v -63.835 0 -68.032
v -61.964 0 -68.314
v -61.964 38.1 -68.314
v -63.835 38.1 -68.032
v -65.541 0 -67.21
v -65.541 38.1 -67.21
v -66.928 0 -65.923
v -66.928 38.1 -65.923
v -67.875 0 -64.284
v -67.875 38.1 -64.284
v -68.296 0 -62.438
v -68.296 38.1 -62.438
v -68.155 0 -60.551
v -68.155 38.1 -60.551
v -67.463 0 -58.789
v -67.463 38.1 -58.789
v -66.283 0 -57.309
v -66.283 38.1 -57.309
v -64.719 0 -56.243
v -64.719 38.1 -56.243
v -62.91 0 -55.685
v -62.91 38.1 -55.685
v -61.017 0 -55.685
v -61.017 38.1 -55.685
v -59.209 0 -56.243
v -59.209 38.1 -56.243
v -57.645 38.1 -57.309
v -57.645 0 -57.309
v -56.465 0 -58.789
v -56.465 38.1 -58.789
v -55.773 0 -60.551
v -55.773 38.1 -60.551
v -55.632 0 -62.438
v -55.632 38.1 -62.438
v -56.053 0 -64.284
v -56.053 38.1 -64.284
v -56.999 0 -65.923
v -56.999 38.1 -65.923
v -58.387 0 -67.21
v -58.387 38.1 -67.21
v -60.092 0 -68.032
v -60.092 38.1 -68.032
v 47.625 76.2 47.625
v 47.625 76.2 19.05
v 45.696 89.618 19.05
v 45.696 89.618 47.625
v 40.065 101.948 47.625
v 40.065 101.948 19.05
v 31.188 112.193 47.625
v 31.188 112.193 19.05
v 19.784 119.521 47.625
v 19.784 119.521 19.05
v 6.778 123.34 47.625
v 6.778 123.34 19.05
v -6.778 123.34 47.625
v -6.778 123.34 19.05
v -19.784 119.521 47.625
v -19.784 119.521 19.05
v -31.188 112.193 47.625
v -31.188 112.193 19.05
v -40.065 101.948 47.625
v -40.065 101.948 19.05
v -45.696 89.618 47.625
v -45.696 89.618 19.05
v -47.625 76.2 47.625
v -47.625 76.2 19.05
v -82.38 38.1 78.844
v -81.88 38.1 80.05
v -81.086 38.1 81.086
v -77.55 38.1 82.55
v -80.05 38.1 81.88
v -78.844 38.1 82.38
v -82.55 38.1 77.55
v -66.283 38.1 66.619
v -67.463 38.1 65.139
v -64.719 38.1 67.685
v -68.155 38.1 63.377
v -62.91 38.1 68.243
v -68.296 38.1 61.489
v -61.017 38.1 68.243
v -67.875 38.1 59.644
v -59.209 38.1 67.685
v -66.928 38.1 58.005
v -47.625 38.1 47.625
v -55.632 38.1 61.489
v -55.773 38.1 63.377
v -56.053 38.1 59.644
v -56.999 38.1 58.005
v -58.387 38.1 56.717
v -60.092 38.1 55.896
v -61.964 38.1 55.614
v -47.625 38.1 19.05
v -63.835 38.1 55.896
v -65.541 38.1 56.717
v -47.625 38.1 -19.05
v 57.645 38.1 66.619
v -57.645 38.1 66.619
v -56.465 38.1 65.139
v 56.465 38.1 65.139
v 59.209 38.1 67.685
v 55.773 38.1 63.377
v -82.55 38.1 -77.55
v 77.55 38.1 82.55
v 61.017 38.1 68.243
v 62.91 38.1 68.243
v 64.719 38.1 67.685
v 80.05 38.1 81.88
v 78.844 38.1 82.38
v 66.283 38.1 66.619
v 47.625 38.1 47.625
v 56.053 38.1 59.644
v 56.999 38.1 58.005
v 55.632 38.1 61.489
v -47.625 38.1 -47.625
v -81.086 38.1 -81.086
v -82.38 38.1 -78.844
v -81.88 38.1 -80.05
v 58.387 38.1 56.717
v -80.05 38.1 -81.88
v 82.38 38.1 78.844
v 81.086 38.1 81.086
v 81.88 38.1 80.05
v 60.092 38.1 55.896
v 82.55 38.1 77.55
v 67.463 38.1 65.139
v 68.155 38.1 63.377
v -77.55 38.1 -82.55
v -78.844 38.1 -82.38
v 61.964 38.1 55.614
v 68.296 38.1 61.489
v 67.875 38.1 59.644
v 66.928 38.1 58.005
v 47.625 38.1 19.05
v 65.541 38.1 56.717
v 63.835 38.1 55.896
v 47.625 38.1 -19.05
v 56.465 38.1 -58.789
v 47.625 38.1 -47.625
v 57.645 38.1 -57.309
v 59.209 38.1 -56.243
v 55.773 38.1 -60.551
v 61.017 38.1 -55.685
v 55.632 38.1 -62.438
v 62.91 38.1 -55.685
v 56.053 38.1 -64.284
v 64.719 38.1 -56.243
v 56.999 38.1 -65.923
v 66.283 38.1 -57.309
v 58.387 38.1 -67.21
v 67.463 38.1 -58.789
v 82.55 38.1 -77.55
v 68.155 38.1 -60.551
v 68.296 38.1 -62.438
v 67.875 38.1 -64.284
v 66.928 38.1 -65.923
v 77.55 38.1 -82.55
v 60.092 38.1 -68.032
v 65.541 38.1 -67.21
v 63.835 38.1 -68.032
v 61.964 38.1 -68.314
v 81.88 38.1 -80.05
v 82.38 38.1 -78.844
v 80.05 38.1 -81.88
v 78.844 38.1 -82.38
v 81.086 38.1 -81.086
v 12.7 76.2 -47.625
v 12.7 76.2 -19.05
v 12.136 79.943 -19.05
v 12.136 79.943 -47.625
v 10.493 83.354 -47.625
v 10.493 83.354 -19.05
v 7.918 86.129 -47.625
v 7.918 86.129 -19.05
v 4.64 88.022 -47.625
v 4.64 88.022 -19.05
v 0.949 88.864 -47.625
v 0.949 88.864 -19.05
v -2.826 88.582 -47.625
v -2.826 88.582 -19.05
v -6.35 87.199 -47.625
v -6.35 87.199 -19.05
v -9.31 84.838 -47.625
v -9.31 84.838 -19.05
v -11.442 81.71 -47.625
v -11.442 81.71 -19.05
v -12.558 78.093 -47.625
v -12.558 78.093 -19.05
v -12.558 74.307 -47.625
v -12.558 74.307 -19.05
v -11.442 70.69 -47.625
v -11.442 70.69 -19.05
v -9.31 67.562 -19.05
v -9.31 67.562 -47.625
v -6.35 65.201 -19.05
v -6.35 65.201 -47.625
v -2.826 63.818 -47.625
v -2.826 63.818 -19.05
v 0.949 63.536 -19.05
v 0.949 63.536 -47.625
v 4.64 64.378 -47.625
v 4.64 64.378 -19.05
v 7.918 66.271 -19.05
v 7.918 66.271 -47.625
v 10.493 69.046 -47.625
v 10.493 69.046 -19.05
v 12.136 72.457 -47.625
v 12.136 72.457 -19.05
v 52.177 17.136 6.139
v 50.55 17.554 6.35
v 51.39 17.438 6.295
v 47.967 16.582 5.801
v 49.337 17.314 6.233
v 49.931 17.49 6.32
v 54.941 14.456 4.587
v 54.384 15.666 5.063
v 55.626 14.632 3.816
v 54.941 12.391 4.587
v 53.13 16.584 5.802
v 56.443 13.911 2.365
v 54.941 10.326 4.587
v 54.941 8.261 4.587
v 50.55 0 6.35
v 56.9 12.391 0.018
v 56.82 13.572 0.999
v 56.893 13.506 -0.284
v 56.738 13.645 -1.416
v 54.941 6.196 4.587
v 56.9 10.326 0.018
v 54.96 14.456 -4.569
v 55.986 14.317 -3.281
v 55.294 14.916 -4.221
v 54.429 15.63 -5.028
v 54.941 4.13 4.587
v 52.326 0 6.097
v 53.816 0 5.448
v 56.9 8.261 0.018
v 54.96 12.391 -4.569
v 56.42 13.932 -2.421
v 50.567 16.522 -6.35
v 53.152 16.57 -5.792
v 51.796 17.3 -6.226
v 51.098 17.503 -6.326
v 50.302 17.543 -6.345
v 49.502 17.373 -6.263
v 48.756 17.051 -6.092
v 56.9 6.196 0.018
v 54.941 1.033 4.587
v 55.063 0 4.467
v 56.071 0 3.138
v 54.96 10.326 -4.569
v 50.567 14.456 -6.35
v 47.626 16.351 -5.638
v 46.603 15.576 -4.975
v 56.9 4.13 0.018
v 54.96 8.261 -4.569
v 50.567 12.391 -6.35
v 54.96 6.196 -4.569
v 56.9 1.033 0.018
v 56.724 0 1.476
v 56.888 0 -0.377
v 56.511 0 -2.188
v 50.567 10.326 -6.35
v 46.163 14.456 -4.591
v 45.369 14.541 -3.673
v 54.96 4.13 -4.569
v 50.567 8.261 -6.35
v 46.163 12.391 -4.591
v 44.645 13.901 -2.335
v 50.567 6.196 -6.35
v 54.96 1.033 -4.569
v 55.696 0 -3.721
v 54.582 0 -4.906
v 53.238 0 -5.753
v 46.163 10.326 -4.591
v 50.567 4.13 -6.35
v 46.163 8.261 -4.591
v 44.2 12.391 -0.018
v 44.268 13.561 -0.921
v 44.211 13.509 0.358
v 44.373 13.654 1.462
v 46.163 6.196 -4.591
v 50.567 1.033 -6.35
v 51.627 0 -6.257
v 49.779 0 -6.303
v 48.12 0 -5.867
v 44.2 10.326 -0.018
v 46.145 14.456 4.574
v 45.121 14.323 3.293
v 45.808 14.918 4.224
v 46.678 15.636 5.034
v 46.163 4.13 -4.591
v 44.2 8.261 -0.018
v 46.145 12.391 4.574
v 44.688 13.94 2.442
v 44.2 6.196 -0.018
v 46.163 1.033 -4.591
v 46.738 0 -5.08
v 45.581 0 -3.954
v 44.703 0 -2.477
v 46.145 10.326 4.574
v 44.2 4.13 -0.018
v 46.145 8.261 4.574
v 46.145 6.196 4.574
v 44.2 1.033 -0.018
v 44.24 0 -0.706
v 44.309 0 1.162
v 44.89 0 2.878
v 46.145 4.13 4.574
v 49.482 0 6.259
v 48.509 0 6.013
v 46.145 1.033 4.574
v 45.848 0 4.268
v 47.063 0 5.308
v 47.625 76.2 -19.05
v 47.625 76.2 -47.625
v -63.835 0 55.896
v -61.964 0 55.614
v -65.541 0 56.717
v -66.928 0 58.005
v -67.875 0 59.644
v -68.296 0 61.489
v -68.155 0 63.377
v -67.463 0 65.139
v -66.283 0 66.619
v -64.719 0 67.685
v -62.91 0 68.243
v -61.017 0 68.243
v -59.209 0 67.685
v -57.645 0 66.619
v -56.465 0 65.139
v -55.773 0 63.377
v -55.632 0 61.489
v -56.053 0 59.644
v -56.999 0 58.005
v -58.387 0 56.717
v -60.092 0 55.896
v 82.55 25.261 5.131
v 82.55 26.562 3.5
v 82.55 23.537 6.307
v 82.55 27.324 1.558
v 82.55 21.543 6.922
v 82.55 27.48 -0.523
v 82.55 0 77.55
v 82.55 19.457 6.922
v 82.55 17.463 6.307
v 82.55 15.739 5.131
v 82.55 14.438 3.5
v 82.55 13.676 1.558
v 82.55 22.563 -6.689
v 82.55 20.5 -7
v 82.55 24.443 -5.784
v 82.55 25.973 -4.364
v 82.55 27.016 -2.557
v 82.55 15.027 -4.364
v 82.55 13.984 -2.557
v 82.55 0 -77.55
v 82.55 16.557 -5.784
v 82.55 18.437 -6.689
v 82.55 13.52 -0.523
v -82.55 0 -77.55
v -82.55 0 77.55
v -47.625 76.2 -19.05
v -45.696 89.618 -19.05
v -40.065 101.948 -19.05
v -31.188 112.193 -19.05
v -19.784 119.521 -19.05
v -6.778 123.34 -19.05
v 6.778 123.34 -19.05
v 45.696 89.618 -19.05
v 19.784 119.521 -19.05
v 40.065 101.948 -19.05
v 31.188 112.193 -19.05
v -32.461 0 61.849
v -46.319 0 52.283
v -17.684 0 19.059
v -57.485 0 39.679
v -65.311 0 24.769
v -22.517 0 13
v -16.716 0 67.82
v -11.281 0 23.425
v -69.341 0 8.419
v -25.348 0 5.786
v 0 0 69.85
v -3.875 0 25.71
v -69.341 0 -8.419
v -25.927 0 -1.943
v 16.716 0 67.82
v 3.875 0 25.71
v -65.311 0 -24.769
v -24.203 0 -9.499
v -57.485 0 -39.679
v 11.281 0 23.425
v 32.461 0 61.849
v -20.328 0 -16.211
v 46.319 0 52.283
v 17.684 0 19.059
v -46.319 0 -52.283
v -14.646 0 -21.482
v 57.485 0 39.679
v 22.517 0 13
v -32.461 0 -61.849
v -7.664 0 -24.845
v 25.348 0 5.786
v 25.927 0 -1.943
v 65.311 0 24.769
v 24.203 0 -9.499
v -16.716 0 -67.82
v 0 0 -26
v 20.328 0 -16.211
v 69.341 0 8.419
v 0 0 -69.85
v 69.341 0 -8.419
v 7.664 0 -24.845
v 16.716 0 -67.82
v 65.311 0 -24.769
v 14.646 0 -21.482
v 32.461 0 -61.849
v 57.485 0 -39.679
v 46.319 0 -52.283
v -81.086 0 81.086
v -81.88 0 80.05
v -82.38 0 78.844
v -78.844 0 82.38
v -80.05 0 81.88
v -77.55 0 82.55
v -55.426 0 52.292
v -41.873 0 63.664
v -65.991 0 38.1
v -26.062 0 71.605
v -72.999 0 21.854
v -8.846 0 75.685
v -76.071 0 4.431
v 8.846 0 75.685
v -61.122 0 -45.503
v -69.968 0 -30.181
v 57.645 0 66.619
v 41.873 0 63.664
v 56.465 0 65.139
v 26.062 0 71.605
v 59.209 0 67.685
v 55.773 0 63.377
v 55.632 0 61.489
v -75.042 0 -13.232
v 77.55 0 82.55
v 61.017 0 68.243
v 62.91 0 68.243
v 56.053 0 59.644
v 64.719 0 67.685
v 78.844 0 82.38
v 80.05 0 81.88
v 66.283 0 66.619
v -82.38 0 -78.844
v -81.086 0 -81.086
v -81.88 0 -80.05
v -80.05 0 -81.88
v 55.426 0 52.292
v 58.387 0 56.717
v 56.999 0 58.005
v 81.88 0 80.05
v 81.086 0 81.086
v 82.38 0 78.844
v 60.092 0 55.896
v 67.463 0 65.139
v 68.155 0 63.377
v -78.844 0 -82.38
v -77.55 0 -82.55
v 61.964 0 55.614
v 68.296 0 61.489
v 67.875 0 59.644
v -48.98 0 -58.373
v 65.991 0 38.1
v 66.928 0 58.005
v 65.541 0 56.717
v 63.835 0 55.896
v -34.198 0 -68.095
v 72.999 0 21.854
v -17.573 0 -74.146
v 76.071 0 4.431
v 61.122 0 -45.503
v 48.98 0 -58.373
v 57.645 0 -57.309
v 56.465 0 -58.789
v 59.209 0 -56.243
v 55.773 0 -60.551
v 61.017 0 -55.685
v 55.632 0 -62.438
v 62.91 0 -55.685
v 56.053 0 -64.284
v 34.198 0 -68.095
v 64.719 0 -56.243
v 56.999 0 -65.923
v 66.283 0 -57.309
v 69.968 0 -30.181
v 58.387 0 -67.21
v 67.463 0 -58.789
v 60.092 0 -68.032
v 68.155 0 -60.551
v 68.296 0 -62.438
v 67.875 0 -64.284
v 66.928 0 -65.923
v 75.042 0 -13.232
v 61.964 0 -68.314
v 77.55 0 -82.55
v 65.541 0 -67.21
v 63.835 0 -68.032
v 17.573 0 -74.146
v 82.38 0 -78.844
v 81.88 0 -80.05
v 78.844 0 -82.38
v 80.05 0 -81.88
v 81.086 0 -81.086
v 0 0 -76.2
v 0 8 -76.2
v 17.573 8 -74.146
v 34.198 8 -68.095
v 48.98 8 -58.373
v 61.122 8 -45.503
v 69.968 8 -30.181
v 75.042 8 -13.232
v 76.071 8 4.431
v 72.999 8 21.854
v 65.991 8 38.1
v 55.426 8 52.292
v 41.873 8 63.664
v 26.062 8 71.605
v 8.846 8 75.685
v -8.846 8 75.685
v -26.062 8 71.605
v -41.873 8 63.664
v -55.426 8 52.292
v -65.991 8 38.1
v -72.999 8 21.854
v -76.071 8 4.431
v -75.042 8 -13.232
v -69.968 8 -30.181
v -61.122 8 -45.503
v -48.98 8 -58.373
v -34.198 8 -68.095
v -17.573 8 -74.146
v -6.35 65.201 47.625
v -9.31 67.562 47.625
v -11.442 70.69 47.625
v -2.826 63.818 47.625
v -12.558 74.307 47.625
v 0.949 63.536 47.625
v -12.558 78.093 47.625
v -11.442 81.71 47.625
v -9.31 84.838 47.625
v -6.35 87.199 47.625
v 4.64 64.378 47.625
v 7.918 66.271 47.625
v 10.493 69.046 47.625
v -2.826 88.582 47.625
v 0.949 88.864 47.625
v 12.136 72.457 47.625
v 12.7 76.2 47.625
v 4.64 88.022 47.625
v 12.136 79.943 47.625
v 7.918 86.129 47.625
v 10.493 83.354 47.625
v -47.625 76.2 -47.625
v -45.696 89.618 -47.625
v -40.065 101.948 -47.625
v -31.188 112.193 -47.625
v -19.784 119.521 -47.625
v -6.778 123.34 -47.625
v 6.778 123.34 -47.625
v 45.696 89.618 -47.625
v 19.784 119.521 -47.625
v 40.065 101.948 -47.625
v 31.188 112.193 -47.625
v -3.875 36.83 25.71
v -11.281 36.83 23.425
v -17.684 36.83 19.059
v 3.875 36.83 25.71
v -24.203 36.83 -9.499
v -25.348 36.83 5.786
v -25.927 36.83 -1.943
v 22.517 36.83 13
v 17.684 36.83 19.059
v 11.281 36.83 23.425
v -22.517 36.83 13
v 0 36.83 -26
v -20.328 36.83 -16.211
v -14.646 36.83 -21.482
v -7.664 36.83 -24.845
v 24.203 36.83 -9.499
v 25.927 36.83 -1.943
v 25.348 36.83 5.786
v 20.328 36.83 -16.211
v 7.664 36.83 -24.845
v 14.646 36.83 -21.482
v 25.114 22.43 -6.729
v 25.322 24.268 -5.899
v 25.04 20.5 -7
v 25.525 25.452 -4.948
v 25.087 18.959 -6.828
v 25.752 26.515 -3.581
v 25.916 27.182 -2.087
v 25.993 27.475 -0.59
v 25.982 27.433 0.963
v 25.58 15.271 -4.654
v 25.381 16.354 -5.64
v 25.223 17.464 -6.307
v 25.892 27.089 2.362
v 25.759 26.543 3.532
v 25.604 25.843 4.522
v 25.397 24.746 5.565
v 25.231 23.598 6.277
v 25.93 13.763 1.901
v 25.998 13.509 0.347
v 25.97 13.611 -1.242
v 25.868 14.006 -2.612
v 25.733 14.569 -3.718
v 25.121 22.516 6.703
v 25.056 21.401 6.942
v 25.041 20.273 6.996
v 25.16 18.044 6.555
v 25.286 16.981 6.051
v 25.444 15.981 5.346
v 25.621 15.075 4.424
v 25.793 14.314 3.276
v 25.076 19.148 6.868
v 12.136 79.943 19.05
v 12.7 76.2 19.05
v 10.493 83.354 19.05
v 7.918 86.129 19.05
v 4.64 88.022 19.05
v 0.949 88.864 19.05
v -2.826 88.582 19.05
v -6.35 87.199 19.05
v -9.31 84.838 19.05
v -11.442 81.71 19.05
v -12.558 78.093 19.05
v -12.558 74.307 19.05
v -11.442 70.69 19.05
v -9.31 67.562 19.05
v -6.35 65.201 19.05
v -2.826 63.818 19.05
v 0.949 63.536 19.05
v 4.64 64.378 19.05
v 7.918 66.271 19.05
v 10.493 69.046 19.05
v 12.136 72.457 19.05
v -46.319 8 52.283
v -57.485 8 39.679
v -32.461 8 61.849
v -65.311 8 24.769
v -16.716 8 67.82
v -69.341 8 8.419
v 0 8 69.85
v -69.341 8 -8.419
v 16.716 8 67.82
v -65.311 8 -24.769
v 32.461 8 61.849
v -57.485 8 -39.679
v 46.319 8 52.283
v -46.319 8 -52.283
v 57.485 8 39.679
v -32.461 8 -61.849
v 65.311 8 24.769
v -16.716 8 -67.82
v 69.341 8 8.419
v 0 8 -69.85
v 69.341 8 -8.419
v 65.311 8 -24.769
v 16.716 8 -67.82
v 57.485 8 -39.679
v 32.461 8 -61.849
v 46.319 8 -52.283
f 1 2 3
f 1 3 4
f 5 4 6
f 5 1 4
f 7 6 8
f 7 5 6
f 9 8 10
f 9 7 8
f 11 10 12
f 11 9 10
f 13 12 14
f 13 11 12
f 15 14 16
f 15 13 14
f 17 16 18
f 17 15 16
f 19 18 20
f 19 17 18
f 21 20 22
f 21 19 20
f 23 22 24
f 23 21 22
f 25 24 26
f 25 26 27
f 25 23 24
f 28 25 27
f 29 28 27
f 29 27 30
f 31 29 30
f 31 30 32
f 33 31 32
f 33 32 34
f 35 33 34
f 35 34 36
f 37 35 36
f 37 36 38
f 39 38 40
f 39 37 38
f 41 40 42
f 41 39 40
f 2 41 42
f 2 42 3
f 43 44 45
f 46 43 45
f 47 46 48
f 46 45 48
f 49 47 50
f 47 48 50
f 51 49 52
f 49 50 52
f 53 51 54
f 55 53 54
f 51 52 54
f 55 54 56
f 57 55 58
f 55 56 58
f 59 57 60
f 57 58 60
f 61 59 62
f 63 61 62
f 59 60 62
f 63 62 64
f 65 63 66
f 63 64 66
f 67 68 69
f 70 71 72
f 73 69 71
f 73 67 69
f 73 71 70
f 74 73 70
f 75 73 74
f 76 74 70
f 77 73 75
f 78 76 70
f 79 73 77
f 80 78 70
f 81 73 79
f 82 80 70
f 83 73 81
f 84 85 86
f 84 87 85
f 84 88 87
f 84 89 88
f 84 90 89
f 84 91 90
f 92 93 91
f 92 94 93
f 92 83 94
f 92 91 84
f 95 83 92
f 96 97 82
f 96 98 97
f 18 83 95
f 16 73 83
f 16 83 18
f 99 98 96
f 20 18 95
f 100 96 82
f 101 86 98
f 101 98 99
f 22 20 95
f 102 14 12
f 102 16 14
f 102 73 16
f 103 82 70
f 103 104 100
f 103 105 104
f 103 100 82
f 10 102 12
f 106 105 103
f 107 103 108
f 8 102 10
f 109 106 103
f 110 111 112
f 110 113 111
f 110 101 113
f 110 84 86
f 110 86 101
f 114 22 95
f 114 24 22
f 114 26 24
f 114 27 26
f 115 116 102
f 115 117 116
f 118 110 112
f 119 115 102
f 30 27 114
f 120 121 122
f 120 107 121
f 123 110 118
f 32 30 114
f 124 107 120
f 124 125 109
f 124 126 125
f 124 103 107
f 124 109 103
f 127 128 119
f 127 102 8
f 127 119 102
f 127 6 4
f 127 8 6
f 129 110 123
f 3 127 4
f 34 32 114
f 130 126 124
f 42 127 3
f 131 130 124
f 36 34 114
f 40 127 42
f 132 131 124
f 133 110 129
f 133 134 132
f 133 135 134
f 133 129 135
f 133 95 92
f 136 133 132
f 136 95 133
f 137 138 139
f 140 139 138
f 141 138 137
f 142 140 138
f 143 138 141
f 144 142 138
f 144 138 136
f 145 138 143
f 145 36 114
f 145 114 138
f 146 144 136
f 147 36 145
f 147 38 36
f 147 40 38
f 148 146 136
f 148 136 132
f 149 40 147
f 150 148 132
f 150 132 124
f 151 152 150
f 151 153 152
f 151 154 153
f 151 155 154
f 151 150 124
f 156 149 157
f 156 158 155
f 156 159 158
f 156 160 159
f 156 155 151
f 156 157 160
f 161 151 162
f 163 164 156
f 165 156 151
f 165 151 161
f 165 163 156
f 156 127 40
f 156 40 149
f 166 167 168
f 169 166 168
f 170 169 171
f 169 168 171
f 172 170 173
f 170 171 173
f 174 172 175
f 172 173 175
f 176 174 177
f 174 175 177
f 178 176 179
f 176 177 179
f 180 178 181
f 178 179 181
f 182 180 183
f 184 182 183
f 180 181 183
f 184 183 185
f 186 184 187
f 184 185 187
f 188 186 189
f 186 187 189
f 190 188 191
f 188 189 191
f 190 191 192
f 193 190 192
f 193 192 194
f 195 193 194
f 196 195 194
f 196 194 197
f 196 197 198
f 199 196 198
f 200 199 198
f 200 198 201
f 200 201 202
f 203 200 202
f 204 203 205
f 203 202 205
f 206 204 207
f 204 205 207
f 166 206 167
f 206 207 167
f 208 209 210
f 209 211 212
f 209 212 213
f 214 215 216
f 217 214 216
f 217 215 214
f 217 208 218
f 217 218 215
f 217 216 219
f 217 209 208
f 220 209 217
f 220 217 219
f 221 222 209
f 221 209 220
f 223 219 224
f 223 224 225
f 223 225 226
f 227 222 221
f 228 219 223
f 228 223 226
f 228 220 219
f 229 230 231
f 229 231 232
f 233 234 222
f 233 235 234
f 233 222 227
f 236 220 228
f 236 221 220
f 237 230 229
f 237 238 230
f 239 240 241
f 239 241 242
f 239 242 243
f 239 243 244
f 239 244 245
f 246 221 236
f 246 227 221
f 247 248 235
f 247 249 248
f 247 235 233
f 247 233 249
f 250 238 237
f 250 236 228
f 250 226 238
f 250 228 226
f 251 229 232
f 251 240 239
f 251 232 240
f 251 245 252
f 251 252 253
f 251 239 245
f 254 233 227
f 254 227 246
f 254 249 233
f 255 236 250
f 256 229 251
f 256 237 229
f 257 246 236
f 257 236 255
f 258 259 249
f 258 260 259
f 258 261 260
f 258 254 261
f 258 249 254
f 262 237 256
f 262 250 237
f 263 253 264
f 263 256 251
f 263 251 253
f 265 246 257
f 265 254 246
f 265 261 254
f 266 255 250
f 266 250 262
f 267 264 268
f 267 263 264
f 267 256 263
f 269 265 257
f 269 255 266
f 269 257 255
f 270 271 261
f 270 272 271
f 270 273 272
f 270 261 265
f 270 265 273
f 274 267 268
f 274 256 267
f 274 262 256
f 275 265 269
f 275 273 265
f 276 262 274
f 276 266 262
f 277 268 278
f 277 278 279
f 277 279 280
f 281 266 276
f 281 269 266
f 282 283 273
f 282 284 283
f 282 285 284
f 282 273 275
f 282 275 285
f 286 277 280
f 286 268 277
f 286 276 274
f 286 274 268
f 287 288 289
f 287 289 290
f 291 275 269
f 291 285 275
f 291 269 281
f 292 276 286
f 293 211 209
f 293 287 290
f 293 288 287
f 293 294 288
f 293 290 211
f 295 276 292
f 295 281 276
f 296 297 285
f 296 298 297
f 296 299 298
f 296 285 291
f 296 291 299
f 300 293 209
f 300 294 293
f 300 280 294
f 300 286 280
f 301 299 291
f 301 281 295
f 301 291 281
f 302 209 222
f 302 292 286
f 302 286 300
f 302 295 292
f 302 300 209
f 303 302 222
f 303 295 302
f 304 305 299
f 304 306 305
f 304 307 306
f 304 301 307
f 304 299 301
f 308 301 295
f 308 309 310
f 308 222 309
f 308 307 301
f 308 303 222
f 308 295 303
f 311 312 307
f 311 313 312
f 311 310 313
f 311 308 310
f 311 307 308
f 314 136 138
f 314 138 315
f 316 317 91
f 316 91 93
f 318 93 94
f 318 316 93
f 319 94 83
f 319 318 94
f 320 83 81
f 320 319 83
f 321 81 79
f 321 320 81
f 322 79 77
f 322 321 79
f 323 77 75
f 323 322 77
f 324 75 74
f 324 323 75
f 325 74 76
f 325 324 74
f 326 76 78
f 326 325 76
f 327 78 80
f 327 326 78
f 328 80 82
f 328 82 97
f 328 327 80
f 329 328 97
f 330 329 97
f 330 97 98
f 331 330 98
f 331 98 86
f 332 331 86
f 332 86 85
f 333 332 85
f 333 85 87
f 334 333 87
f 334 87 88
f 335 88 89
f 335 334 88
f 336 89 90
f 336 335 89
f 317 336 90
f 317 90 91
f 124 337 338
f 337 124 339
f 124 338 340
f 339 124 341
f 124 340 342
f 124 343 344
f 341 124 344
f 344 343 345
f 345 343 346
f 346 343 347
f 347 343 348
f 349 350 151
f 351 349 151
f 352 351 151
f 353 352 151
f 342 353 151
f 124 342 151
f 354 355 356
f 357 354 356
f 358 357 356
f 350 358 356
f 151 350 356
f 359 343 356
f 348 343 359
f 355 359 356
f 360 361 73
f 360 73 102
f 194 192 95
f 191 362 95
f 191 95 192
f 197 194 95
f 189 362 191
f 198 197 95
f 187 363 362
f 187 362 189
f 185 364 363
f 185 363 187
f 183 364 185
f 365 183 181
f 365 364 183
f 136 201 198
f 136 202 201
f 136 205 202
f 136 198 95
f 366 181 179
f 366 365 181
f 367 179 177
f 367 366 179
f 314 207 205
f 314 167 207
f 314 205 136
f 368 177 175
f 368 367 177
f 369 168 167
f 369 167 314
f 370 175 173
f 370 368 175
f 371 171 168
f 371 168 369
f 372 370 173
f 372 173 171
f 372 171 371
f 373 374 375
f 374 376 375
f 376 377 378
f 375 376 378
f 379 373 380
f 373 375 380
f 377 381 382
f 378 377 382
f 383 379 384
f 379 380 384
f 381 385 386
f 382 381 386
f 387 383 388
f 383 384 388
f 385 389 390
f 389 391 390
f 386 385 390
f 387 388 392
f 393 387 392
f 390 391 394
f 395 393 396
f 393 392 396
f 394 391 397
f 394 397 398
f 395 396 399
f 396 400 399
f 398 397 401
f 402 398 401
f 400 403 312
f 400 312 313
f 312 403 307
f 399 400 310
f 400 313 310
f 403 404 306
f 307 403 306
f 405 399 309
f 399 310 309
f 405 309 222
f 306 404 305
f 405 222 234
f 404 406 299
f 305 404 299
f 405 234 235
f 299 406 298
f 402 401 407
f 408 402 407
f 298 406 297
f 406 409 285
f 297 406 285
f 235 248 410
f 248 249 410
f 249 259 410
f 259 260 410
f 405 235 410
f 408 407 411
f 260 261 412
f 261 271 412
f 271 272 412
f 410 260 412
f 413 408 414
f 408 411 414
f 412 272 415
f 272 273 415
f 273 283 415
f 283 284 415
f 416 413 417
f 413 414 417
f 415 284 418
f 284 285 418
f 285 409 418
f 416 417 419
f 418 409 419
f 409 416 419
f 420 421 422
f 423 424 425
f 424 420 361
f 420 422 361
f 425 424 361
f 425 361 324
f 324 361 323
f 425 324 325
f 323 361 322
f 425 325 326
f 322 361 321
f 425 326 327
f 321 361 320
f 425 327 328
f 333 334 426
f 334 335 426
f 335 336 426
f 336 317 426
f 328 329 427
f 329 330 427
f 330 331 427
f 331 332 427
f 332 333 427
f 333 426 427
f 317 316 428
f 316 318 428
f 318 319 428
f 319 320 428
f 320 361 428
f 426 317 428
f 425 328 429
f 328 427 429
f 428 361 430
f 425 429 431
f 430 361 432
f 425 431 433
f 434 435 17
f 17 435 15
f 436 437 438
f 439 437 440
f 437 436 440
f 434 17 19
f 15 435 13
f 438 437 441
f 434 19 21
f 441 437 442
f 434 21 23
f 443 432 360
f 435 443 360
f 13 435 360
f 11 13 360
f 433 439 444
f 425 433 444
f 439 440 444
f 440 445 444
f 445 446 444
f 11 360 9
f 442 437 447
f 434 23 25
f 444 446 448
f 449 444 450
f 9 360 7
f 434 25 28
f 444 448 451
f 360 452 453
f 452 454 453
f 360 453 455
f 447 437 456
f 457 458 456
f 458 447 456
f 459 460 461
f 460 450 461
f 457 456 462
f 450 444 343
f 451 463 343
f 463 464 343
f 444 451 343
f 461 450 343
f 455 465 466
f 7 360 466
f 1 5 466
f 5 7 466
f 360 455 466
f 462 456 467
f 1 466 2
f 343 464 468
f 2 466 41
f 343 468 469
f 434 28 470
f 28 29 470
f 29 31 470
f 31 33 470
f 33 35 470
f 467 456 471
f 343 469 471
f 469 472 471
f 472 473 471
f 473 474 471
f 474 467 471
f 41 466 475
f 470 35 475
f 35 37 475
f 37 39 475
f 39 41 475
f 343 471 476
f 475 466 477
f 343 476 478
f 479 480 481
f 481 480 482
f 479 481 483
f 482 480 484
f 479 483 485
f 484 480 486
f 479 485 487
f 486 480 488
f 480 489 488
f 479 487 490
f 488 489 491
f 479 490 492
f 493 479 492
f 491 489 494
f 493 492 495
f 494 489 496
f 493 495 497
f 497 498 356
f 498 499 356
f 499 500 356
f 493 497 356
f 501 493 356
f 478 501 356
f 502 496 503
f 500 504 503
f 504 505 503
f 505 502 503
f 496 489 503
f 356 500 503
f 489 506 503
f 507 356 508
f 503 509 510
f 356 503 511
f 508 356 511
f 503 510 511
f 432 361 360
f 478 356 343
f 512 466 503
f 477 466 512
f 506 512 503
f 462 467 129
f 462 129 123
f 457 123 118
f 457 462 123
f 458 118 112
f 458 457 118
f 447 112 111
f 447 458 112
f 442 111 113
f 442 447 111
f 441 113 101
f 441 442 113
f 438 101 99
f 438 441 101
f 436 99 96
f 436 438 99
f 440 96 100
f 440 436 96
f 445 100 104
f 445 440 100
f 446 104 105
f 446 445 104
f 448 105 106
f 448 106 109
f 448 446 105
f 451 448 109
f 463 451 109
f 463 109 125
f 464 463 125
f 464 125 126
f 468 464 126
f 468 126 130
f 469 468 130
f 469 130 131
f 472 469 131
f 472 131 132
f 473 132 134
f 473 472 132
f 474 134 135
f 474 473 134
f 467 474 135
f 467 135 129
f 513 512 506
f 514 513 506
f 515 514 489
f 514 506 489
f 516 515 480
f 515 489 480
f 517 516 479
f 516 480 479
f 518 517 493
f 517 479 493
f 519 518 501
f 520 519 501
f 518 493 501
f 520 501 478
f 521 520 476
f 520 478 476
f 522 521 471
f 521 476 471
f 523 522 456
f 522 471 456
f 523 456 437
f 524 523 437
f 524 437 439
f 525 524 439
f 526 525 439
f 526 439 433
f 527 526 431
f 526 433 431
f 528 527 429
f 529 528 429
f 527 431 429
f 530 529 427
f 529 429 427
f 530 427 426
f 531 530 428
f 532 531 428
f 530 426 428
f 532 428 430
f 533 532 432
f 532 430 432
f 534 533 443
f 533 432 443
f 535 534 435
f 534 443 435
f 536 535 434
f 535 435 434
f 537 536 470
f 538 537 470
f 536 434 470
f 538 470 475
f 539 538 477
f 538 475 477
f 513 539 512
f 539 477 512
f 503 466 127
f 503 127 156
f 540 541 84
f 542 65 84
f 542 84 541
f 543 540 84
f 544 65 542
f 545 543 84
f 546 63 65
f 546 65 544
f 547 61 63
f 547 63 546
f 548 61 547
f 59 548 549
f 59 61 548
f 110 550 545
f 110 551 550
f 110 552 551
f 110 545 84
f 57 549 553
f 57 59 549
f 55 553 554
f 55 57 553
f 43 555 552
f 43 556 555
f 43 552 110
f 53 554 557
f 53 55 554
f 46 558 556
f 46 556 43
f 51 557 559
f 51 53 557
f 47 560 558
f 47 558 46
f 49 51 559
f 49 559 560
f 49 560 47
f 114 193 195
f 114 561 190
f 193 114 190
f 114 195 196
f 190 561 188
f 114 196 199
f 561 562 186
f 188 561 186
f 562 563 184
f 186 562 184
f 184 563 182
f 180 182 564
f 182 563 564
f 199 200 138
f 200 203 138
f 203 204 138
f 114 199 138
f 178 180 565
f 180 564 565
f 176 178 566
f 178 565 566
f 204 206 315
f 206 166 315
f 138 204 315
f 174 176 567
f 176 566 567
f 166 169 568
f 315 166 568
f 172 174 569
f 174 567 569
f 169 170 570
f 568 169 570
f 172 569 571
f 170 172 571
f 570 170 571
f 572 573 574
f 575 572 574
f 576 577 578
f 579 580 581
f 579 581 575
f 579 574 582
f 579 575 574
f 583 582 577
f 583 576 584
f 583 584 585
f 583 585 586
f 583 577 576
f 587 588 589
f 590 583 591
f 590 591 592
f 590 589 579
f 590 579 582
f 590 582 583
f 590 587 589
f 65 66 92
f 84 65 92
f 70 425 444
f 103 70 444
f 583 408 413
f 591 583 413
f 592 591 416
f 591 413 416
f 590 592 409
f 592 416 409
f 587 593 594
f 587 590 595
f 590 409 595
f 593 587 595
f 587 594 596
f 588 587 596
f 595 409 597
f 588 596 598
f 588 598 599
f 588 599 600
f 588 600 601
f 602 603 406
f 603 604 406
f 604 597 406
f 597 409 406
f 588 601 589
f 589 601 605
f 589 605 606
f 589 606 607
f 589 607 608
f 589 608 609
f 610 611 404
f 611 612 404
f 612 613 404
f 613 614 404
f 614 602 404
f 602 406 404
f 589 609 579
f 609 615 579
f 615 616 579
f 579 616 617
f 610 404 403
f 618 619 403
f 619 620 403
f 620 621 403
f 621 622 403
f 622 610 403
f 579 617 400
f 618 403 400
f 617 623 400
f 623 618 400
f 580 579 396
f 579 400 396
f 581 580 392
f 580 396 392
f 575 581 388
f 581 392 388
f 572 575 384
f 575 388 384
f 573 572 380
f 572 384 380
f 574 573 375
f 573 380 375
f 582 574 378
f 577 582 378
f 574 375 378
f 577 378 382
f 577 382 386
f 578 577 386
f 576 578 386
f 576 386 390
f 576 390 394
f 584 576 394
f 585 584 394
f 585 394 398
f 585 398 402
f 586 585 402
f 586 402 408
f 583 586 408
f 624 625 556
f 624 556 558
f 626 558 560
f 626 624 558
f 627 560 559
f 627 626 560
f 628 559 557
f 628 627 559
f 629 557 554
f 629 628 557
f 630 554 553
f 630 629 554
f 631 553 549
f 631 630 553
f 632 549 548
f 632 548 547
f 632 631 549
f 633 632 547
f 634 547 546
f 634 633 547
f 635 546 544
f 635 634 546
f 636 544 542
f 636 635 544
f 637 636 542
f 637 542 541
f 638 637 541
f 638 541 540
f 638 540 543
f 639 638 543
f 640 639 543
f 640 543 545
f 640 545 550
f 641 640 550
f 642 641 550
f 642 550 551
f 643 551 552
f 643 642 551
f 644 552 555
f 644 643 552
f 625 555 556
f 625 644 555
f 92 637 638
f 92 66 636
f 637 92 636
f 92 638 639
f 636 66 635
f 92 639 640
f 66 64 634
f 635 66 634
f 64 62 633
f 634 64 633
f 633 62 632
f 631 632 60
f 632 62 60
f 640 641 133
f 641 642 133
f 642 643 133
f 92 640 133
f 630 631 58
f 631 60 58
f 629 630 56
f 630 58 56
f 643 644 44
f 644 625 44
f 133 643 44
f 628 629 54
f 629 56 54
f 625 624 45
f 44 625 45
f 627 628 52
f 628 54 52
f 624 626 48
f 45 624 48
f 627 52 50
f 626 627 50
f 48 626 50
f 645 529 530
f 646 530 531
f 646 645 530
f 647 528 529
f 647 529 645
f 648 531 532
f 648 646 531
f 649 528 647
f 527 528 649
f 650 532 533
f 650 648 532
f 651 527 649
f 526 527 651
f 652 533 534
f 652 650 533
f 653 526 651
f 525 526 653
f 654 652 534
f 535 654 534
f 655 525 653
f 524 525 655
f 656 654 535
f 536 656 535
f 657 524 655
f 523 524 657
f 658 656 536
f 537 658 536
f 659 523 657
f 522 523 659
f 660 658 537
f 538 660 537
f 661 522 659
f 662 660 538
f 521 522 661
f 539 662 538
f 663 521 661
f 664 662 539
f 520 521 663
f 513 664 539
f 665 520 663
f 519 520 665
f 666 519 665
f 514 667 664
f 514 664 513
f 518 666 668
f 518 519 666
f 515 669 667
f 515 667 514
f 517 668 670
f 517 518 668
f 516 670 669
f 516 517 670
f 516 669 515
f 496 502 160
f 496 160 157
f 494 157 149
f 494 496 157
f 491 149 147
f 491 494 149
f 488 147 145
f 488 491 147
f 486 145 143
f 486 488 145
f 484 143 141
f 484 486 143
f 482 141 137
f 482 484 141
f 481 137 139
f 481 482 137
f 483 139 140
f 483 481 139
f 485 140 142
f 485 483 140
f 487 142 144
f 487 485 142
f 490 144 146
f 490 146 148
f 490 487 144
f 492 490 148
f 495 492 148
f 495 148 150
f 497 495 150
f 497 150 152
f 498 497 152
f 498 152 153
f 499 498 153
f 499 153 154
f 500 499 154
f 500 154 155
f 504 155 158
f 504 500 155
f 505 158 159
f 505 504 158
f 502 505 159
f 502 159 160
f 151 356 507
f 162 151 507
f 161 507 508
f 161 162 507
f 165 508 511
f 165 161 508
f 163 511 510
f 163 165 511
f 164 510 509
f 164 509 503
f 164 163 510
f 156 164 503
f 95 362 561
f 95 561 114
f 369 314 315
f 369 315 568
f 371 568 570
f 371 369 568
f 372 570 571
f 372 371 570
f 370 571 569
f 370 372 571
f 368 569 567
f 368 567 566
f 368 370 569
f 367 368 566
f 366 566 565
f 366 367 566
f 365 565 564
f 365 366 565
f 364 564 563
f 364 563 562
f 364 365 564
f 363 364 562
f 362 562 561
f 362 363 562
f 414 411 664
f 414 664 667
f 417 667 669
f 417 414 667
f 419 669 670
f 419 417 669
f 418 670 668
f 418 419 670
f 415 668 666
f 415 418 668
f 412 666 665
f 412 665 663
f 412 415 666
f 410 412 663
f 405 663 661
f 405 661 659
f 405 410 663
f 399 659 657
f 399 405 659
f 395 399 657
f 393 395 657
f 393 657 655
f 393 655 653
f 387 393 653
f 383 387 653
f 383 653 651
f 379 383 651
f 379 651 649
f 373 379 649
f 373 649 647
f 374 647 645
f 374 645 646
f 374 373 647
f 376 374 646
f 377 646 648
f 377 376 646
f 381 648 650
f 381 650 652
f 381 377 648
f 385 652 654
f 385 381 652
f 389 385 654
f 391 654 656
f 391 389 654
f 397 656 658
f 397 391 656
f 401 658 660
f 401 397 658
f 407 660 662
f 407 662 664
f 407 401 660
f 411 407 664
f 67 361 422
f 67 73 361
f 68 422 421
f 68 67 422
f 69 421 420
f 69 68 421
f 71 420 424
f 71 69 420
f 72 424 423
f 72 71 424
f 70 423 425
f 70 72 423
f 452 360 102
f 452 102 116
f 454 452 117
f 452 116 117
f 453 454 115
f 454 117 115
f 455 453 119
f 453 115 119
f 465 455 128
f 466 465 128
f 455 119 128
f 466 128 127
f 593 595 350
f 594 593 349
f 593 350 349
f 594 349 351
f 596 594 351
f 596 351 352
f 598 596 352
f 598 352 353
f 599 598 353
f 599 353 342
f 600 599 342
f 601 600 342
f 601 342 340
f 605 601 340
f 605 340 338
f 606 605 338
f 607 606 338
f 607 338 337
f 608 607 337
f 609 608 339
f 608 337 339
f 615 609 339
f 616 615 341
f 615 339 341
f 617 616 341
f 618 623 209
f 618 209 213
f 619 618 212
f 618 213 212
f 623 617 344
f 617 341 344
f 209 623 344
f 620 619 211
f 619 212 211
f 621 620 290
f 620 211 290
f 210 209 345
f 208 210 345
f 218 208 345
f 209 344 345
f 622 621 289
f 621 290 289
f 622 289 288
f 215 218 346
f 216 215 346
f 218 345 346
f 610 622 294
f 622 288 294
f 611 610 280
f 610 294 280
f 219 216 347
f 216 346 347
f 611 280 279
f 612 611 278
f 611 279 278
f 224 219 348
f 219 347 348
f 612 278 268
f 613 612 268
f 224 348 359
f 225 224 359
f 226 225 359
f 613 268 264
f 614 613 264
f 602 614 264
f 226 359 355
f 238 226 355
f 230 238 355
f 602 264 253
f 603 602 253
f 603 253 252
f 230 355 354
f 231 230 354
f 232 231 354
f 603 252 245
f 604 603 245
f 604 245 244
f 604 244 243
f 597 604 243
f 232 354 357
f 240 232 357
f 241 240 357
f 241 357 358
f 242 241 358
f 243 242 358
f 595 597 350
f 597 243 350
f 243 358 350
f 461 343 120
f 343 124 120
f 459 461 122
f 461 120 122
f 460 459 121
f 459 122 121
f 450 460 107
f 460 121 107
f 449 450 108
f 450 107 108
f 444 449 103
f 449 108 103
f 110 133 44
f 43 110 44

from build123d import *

# Parameters (mm, degrees)
SKETCH1_W           = 165.1
SKETCH1_H           = 165.1
SKETCH1_R           = 6.35
BOSS_EXTRUDE1_DEPTH = 38.1
BOSS_EXTRUDE2_START = 19.05
SKETCH2_R           = 12.7
BOSS_EXTRUDE2_DEPTH = 28.575
SKETCH3_R           = 26
CUT_EXTRUDE1_DEPTH  = 36.83
SKETCH4_R           = 7
CUT_EXTRUDE2_DEPTH  = 74.83
CUT_EXTRUDE3_START  = -38.1
CUT_EXTRUDE3_DEPTH  = 17.554240545
FILLET1_R           = 5
SKETCH6_R           = 76.2
SKETCH6_R_2         = 69.85
CUT_EXTRUDE4_DEPTH  = 8


# Read off the part's stored shape, not the designer's step: Cut-Extrude3
with BuildPart() as part:
    # Sketch1 → Boss-Extrude1 (new body)
    with BuildSketch(Plane(origin=(0, 0, 0), x_dir=(1, 0, 0), z_dir=(0, 1, 0))):
        Rectangle(SKETCH1_W, SKETCH1_H)
        with Locations(Location((-61.963767235, 61.963767235, 0), (0, 0, 90))):
            Circle(SKETCH1_R, mode=Mode.SUBTRACT)
        with Locations(Location((61.963767235, 61.963767235, 0), (0, 0, 90))):
            Circle(SKETCH1_R, mode=Mode.SUBTRACT)
        with Locations(Location((61.963767235, -61.963767235, 0), (0, 0, 90))):
            Circle(SKETCH1_R, mode=Mode.SUBTRACT)
        with Locations(Location((-61.963767235, -61.963767235, 0), (0, 0, 90))):
            Circle(SKETCH1_R, mode=Mode.SUBTRACT)
    extrude(amount=BOSS_EXTRUDE1_DEPTH)

    # Sketch2 → Boss-Extrude2 (add)
    with BuildSketch(Plane.XY.offset(BOSS_EXTRUDE2_START)):
        with BuildLine():
            Line((-47.625, 76.2), (-47.625, 38.1))
            Line((-47.625, 38.1), (47.625, 38.1))
            Line((47.625, 38.1), (47.625, 76.2))
            ThreePointArc((47.625, 76.2), (0, 123.825), (-47.625, 76.2))
        make_face()
        with Locations((0, 76.2)):
            Circle(SKETCH2_R, mode=Mode.SUBTRACT)
    boss_extrude2 = extrude(amount=BOSS_EXTRUDE2_DEPTH)

    # Mirror1: Boss-Extrude2 across plane
    add(boss_extrude2.mirror(Plane.XY))

    # Sketch3 → Cut-Extrude1 (cut)
    with BuildSketch(Plane.XZ):
        with Locations(Location((0, 0, 0), (0, 0, 270))):
            Circle(SKETCH3_R)
    extrude(amount=-CUT_EXTRUDE1_DEPTH, mode=Mode.SUBTRACT)

    # Sketch4 → Cut-Extrude2 (cut)
    with BuildSketch(Plane(origin=(82.55, 0, 0), x_dir=(0, 0, -1), z_dir=(1, 0, 0))):
        with Locations((0, 20.5)):
            Circle(SKETCH4_R)
    extrude(amount=-CUT_EXTRUDE2_DEPTH, mode=Mode.SUBTRACT)

    # Cut-Extrude3 outline → Cut-Extrude3 (cut)
    with BuildSketch(Plane(origin=(0, 38.1, 0), x_dir=(1, 0, 0), z_dir=(0, 1, 0)).offset(CUT_EXTRUDE3_START)):
        with BuildLine():
            add(Edge.make_bspline(
                [(50.55, -6.35), (51.47422126, -6.35), (52.302466674, -6.153856691), (53.750900163, -5.540336611), (54.377469866, -5.126654902), (55.505405632, -4.046735856), (55.989700628, -3.386313597), (56.692940175, -1.822566515), (56.897346558, -0.923572623), (56.902599966, 0.886717767), (56.699688489, 1.798962244), (56.004003016, 3.362853664), (55.518127515, 4.030235701), (54.400965604, 5.108341681), (53.760643664, 5.533511906), (52.329554982, 6.145011865), (51.480571337, 6.347463595), (50.110922006, 6.351232148), (49.655780423, 6.301077578), (48.823880157, 6.125660583), (48.443917363, 6.00347472), (47.356446167, 5.544626686), (46.727263651, 5.130170088), (45.598462304, 4.051448232), (45.112857079, 3.390908719), (44.407214336, 1.82399818), (44.202597079, 0.923991808), (44.197454079, -0.88794427), (44.40080252, -1.801200354), (45.098290108, -3.366869707), (45.585297177, -4.034583157), (46.704472395, -5.112538783), (47.346247575, -5.537622225), (48.779720786, -6.147796435), (49.62577874, -6.35), (50.55, -6.35)],
                knots=[0, 0, 0, 0, 0.0625, 0.0625, 0.125, 0.125, 0.1875, 0.1875, 0.25, 0.25, 0.3125, 0.3125, 0.375, 0.375, 0.4375, 0.4375, 0.5, 0.5, 0.53125, 0.53125, 0.5625, 0.5625, 0.625, 0.625, 0.6875, 0.6875, 0.75, 0.75, 0.8125, 0.8125, 0.875, 0.875, 0.9375, 0.9375, 1, 1, 1, 1], degree=3))
        make_face()
    extrude(amount=CUT_EXTRUDE3_DEPTH, mode=Mode.SUBTRACT)

    # Fillet1
    fillet1_edges = [part.edges().sort_by_distance(p)[0] for p in [
        (82.55, 19.05, 82.55),
        (-82.55, 19.05, 82.55),
        (-82.55, 19.05, -82.55),
        (82.55, 19.05, -82.55),
    ]]
    fillet(fillet1_edges, radius=FILLET1_R)

    # Sketch6 → Cut-Extrude4 (cut)
    with BuildSketch(Plane.XZ):
        with Locations(Location((0, 0, 0), (0, 0, 270))):
            Circle(SKETCH6_R)
        with Locations(Location((0, 0, 0), (0, 0, 270))):
            Circle(SKETCH6_R_2, mode=Mode.SUBTRACT)
    extrude(amount=-CUT_EXTRUDE4_DEPTH, mode=Mode.SUBTRACT)


solid = part.part
